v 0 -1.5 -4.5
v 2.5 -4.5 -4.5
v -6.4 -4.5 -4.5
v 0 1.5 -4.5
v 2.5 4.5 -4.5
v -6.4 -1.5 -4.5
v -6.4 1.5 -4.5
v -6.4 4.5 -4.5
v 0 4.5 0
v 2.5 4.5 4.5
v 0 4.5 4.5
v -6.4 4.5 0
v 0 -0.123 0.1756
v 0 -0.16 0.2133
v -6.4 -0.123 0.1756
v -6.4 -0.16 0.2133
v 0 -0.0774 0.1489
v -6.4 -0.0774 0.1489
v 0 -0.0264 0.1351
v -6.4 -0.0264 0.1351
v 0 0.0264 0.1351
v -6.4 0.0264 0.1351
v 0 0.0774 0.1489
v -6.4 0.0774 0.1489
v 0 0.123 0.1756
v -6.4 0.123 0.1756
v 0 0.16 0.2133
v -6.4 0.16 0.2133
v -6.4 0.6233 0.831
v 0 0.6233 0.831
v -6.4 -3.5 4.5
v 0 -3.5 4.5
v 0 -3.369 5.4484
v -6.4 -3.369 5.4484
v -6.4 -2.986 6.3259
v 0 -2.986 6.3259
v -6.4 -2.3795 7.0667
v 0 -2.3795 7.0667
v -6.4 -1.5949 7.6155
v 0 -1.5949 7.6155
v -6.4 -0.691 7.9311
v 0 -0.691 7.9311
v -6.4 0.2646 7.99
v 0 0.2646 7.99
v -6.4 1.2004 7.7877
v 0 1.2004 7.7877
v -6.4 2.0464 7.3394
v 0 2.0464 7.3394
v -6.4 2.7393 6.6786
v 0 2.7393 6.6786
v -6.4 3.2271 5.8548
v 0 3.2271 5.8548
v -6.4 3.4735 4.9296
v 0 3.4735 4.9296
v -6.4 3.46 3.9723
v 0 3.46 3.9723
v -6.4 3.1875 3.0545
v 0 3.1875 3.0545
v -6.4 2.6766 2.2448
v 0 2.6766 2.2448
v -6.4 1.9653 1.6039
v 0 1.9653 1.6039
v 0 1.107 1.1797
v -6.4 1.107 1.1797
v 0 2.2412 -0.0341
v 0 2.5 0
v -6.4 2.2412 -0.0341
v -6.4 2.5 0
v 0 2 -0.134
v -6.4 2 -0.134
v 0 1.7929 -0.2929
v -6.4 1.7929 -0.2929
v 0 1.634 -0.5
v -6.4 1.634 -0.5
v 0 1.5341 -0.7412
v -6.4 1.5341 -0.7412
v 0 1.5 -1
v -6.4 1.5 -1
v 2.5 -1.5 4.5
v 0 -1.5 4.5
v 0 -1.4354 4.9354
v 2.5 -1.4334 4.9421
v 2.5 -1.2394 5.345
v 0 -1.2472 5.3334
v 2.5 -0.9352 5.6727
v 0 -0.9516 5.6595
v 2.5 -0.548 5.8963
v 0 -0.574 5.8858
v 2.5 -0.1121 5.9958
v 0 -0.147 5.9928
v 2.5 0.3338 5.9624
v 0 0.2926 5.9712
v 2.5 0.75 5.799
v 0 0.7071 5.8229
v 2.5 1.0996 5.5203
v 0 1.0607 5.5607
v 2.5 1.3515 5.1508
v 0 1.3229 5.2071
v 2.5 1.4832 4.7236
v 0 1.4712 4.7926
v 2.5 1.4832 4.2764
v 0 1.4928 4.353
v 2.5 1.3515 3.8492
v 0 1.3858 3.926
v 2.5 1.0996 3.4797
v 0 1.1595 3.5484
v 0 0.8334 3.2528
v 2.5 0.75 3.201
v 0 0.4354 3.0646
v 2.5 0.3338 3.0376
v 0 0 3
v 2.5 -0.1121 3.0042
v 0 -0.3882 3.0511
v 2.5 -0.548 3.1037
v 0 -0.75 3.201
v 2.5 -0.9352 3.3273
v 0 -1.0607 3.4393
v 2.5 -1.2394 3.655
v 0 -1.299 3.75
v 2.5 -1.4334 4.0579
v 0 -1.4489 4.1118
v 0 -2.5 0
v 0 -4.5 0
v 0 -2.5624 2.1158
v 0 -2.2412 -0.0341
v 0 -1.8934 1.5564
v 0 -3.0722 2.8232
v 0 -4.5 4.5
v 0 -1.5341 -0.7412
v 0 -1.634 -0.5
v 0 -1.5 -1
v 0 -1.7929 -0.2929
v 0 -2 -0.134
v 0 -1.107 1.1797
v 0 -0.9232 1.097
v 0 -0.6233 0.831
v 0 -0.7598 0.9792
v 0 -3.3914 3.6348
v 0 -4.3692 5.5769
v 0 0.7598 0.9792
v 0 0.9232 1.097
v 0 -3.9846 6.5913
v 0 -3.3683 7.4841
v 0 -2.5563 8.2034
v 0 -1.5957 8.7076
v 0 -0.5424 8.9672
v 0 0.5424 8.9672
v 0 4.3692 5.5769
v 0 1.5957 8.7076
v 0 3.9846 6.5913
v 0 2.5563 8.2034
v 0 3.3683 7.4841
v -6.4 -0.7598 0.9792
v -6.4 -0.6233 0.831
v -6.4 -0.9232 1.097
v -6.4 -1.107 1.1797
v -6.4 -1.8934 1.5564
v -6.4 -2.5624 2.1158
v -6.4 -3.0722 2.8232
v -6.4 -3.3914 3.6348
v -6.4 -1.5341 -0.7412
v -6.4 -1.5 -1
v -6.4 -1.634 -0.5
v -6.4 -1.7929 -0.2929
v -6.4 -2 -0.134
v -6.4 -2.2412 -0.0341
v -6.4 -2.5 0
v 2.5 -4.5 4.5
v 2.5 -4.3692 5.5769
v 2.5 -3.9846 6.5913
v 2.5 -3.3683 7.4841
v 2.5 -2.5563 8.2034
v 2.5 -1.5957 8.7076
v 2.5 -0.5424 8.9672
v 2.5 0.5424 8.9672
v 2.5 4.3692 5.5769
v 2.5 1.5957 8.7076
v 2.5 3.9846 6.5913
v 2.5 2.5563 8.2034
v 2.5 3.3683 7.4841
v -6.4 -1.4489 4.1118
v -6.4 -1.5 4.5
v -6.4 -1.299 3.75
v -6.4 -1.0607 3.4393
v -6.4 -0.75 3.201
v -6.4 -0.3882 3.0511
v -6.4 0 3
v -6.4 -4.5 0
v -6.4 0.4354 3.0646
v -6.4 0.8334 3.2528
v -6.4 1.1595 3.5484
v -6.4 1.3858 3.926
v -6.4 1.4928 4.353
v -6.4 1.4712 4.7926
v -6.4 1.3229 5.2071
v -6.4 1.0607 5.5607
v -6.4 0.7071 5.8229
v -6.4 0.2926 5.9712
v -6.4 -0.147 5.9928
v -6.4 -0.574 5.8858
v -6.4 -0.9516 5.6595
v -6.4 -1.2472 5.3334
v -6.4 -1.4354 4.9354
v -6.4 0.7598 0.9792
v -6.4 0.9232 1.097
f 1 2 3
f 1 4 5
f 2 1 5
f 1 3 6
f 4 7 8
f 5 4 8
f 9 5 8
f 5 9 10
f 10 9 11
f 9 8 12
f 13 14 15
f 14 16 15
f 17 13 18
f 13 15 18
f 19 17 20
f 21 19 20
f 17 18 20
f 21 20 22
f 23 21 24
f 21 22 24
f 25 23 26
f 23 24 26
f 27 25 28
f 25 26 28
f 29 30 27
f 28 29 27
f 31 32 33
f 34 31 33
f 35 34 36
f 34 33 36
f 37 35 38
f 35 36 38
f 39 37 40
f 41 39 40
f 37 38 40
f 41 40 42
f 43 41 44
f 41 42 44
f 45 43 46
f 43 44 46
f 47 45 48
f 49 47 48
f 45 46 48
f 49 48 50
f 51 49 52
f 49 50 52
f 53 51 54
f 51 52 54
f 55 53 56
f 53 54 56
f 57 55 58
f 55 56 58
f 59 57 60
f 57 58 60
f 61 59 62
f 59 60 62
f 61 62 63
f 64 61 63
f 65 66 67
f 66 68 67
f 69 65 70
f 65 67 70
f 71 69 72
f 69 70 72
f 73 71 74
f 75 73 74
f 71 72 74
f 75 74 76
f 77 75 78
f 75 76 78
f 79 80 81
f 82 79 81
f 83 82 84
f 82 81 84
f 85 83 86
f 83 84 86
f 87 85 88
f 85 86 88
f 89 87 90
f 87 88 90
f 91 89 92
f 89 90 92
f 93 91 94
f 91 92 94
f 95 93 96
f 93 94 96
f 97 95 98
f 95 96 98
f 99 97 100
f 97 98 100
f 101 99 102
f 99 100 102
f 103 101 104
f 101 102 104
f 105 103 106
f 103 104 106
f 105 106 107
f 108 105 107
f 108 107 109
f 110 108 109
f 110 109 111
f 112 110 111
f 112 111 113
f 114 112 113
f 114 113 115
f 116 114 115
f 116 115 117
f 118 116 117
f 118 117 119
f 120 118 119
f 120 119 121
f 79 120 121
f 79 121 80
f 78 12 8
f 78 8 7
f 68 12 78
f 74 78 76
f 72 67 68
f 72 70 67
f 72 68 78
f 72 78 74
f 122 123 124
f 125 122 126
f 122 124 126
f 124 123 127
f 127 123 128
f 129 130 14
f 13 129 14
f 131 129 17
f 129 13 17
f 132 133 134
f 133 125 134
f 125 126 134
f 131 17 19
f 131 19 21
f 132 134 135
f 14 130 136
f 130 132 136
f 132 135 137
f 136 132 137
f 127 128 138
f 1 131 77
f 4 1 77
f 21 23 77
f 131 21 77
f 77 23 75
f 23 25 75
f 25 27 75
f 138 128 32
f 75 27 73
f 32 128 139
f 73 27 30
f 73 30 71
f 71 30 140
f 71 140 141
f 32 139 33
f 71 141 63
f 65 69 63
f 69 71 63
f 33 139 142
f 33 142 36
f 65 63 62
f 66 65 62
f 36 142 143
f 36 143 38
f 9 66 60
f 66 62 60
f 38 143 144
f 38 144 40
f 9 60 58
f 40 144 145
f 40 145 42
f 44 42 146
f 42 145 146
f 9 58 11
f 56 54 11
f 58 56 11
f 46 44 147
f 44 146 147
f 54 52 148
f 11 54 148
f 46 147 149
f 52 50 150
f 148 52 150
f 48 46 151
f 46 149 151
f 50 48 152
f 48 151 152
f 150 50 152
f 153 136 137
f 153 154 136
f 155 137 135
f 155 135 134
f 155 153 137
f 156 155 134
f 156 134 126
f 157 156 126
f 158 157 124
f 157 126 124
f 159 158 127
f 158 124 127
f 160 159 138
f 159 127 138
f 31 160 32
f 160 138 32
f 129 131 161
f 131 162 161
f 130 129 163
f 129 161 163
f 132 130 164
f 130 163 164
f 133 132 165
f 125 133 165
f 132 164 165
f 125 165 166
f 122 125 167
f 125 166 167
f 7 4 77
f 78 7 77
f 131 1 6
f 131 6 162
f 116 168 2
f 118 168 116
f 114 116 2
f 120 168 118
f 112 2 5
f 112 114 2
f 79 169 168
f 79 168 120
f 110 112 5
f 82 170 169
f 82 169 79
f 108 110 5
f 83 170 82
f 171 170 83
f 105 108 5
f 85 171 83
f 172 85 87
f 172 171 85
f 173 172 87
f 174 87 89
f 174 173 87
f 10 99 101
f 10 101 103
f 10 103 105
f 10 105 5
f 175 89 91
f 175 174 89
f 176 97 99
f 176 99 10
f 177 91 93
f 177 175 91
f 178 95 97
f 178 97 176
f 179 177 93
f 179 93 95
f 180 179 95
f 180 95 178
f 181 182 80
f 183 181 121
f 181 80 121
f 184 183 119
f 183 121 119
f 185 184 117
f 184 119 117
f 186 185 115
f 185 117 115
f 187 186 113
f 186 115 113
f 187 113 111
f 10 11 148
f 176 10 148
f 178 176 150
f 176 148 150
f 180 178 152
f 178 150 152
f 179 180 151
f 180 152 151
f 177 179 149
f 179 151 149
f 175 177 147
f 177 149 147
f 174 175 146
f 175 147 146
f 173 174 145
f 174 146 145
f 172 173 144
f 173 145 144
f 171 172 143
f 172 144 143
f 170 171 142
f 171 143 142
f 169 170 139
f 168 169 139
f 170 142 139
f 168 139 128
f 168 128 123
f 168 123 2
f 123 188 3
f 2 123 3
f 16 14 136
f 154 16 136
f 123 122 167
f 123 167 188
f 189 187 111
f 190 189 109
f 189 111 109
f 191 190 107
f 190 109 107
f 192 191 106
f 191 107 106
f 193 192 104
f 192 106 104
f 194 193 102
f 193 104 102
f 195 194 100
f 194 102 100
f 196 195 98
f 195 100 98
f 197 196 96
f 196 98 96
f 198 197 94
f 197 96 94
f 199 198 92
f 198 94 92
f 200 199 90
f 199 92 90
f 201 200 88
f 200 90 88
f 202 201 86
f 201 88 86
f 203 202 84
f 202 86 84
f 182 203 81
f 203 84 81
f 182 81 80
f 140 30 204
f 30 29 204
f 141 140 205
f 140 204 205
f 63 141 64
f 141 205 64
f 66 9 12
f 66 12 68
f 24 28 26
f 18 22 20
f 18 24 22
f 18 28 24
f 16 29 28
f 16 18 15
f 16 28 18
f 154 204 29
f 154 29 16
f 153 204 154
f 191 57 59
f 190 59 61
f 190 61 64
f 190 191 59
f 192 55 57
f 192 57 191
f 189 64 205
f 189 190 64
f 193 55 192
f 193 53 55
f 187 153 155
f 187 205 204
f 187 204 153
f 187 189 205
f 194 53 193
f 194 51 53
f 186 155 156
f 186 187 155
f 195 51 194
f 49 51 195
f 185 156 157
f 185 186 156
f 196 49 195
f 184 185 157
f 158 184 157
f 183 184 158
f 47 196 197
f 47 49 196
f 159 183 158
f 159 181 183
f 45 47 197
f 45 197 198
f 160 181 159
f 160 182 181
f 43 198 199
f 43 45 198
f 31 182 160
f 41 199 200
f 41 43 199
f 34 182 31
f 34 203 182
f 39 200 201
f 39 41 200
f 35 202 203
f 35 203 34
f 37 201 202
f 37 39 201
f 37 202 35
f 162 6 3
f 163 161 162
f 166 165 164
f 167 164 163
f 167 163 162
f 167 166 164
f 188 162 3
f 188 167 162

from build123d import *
from build123d import SkipClean  # not in build123d's __all__

# Parameters (mm, degrees)
F1_DEPTH = 2.5
F2_W     = 3
F2_H     = 4.5
F3_DEPTH = 6.4
F4_R     = 1
F5_R     = 0.2


with BuildPart() as f1:
    # F0 (on Right) → F1 (new body)
    with BuildSketch(Plane.YZ):
        with BuildLine():
            ThreePointArc((-4.5, 4.5), (0, 0), (4.5, 4.5))
            Line((4.5, 4.5), (1.5, 4.5))
            ThreePointArc((1.5, 4.5), (0, 3), (-1.5, 4.5))
            Line((-1.5, 4.5), (-4.5, 4.5))
        make_face()
        with BuildLine():
            Line((1.5, 4.5), (4.5, 4.5))
            ThreePointArc((4.5, 4.5), (0, 9), (-4.5, 4.5))
            Line((-4.5, 4.5), (-1.5, 4.5))
            ThreePointArc((-1.5, 4.5), (0, 6), (1.5, 4.5))
        make_face()
        with BuildLine():
            Line((-4.5, -4.5), (4.5, -4.5))
            Line((4.5, -4.5), (4.5, 4.5))
            ThreePointArc((4.5, 4.5), (0, 0), (-4.5, 4.5))
            Line((-4.5, 4.5), (-4.5, -4.5))
        make_face()
    extrude(amount=F1_DEPTH)

    # F2 (on face) → F3 (join)
    with BuildSketch(Plane(origin=(0, 0, 0), x_dir=(0, -1, 0), z_dir=(-1, 0, 0))):
        with BuildLine():
            ThreePointArc((0.8237365529, 1.0983154039), (2.7507342597, 2.3358694512), (3.5, 4.5))
            ThreePointArc((3.5, 4.5), (-2.1641305488, 7.2507342597), (-0.8237365529, 1.0983154039))
            Line((-0.8237365529, 1.0983154039), (-1.5, 2))
            Line((-1.5, 2), (0, 2))
            Line((0, 2), (1.5, 2))
            Line((1.5, 2), (0.8237365529, 1.0983154039))
        make_face()
        with BuildLine():
            ThreePointArc((1.5, 4.5), (1.0606601718, 3.4393398282), (0, 3))
            ThreePointArc((0, 3), (-1.0606601718, 5.5606601718), (1.5, 4.5))
        make_face(mode=Mode.SUBTRACT)
        with BuildLine():
            Line((-1.5, 2), (-0.8237365529, 1.0983154039))
            ThreePointArc((-0.8237365529, 1.0983154039), (-0.4147914618, 1.0246657653), (0, 1))
            Line((0, 1), (0, 2))
            Line((0, 2), (-1.5, 2))
        make_face()
        with BuildLine():
            ThreePointArc((0, 1), (-0.4147914618, 1.0246657653), (-0.8237365529, 1.0983154039))
            Line((-0.8237365529, 1.0983154039), (0, 0))
            Line((0, 0), (0, 1))
        make_face()
        with BuildLine():
            Line((0, 0), (0.8237365529, 1.0983154039))
            ThreePointArc((0.8237365529, 1.0983154039), (0.4147914618, 1.0246657653), (0, 1))
            Line((0, 1), (0, 0))
        make_face()
        with BuildLine():
            ThreePointArc((0, 1), (0.4147914618, 1.0246657653), (0.8237365529, 1.0983154039))
            Line((0.8237365529, 1.0983154039), (1.5, 2))
            Line((1.5, 2), (0, 2))
            Line((0, 2), (0, 1))
        make_face()
        with Locations((-3, -2.25)):
            Rectangle(F2_W, F2_H)
        with Locations((3, -2.25)):
            Rectangle(F2_W, F2_H)
    with SkipClean():  # cleaning this boolean's faces spoils the solid; the shape is the same uncleaned
        extrude(amount=F3_DEPTH)

    # F4
    f4_edges = [f1.edges().sort_by_distance(p)[0] for p in [
        (-3.2, 1.5, 0),
        (-3.2, -1.5, 0),
        (-3.2, 0.823737, 1.098315),
        (-3.2, -0.823737, 1.098315),
    ]]
    fillet(f4_edges, radius=F4_R)

    # F5
    f5_edges = [f1.edges().sort_by_distance(p)[0] for p in [
        (-3.2, 0, 0),
    ]]
    fillet(f5_edges, radius=F5_R)


solid = f1.part
